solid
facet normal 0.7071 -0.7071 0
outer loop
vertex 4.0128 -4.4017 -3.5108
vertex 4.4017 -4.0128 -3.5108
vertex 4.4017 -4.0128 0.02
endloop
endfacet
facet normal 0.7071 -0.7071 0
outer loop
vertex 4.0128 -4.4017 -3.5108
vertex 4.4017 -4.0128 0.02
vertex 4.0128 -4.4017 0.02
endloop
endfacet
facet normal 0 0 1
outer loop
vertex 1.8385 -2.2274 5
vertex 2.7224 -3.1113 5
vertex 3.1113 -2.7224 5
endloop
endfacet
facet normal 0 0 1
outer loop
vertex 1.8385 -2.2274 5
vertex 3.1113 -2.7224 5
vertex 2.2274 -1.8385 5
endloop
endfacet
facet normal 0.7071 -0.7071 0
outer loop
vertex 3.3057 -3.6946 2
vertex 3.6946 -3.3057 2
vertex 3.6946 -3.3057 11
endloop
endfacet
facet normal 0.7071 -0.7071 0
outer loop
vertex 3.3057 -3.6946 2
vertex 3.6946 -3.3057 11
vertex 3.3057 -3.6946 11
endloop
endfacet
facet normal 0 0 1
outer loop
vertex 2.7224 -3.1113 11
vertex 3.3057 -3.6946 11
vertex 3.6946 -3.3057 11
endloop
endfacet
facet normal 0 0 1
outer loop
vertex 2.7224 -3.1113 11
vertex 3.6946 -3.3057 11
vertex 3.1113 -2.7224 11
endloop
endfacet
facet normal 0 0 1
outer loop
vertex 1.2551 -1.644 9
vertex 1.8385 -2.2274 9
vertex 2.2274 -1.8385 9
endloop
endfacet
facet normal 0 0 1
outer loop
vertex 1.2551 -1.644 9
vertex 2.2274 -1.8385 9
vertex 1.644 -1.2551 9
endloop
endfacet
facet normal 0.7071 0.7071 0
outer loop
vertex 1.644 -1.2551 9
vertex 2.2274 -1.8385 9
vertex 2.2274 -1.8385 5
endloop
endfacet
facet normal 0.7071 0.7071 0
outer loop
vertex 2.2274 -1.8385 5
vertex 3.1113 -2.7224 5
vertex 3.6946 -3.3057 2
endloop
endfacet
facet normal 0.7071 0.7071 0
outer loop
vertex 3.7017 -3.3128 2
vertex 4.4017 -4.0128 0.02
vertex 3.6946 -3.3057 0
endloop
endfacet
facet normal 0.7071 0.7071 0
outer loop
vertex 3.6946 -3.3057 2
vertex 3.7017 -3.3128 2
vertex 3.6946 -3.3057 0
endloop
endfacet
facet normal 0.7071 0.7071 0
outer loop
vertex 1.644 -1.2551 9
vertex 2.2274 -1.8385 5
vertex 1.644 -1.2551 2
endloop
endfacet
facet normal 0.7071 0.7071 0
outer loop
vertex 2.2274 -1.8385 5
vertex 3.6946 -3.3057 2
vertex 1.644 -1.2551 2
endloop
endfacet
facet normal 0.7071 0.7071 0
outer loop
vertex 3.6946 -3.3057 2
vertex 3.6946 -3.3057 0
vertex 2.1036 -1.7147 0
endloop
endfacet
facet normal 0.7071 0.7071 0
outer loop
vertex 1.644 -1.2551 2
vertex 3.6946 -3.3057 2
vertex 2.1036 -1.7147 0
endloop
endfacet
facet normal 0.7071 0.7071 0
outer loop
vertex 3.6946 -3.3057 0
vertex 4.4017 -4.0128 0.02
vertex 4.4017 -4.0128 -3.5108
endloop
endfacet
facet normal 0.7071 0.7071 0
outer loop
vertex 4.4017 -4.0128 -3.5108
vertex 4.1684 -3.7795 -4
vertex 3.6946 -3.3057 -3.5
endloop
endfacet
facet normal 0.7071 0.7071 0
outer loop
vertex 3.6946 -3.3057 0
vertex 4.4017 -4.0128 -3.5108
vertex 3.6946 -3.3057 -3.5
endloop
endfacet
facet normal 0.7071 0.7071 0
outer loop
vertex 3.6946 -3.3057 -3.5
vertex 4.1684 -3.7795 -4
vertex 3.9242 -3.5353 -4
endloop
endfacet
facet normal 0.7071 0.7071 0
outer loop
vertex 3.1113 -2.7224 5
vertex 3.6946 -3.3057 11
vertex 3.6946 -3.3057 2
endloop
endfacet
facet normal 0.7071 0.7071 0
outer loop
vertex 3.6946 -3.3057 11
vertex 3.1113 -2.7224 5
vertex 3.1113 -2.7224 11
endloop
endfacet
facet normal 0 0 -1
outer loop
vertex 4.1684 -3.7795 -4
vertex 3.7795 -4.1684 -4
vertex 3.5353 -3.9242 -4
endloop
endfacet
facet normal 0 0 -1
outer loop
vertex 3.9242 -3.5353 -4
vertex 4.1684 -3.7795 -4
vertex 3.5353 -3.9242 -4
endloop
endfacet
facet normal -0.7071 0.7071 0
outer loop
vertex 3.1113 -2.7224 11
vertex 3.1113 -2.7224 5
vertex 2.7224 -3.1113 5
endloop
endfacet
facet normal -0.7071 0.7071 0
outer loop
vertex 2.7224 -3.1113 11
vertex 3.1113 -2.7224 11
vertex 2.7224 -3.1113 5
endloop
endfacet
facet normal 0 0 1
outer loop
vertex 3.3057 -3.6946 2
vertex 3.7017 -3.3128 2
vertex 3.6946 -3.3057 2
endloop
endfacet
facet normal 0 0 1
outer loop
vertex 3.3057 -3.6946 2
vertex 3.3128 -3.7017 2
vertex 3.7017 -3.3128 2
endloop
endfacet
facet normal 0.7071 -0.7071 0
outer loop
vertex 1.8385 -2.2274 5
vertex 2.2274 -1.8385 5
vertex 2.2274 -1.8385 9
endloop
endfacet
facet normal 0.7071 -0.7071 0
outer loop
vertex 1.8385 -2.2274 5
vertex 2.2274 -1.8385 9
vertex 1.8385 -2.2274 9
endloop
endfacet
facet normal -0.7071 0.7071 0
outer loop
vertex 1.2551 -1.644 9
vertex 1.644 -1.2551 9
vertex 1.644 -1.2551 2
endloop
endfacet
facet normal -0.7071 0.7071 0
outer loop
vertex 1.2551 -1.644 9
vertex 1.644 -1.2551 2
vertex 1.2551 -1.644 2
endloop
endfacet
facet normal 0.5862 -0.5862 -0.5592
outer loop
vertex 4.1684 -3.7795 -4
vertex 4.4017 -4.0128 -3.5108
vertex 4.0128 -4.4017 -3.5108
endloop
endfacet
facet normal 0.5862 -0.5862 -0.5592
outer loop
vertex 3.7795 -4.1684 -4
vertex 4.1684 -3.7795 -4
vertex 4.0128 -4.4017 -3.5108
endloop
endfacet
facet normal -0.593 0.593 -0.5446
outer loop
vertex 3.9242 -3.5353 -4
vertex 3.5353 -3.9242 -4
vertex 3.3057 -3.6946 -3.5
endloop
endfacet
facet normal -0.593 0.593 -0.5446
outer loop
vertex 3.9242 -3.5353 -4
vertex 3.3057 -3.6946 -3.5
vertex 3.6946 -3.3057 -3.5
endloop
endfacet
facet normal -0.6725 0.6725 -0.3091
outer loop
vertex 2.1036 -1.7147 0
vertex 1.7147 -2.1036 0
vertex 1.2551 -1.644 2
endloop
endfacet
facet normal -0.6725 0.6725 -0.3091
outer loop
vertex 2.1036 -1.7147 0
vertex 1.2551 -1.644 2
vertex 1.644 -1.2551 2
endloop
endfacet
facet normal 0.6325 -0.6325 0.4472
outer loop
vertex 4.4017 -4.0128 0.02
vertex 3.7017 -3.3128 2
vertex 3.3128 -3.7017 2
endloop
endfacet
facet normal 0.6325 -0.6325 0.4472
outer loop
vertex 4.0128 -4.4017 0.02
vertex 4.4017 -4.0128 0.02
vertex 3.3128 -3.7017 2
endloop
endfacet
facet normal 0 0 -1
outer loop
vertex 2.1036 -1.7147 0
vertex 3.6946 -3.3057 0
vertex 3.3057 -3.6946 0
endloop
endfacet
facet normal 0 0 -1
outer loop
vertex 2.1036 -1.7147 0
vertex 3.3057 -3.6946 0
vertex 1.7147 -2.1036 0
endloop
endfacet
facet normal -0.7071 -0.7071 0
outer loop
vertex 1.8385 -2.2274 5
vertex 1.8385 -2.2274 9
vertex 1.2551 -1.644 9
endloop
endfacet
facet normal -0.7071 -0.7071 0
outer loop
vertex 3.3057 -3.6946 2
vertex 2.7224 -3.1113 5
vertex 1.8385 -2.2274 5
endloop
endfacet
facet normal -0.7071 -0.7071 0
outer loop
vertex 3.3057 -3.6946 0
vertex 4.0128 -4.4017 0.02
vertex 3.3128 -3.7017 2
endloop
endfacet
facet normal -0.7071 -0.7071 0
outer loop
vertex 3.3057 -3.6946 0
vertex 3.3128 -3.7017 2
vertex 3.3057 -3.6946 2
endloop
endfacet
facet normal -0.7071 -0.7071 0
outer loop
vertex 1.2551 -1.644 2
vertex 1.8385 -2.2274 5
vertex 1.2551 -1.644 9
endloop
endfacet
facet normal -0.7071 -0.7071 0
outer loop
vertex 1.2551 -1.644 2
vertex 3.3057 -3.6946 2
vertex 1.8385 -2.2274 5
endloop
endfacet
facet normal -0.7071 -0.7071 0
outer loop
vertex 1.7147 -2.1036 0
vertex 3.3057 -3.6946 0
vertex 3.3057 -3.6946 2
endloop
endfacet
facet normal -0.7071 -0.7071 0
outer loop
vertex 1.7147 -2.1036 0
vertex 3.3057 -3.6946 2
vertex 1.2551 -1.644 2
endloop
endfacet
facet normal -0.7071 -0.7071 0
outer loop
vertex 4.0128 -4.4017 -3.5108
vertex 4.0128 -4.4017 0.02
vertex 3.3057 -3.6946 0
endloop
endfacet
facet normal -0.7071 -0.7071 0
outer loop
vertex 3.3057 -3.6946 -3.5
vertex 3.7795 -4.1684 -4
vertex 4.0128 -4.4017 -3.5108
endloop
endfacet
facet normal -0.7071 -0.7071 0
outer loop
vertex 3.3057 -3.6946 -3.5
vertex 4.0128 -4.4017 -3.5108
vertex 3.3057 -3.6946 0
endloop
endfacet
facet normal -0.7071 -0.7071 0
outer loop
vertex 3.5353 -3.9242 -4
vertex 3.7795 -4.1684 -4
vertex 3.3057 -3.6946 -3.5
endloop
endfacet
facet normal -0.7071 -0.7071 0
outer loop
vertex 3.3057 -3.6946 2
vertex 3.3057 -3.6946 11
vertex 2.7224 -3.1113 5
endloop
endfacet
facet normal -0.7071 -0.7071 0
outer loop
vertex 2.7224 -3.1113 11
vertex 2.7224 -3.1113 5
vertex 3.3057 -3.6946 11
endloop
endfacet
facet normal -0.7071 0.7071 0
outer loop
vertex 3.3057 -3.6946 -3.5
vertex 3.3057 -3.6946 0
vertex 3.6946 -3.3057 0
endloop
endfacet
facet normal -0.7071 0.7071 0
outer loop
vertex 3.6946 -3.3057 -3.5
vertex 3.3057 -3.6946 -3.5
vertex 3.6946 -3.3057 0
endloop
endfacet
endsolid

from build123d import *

# Parameters (mm, degrees)
BOX076_W                = 2.9
BOX076_H                = 0.55
BOX076_DEPTH            = 15
BOX077_W                = 1.25
BOX077_H                = 0.55
BOX077_DEPTH            = 6
BOX078_W                = 1.1
BOX078_H                = 0.6
BOX078_DEPTH            = 2
BOX080_W                = 1
BOX080_H                = 0.55
BOX080_DEPTH            = 6
BOX079_W                = 3
BOX079_H                = 0.55
BOX079_DEPTH            = 4
CHAMFER038_SIZE2        = 0.65
CHAMFER038_SIZE         = 2
CHAMFER039_ANGLE        = 33
CHAMFER039_SIZE         = 0.5
CHAMFER041_ANGLE        = 56
CHAMFER041_SIZE         = 0.33
CHAMFER040_ANGLE        = 26.565
CHAMFER040_SIZE         = 1.98
BODY030_PLACEMENT_ANGLE = 135


with BuildPart() as part:
    # Box076 → Box076 (join)
    with BuildSketch(Plane(origin=(-4.95, -0.275, 0), x_dir=(1, 0, 0), z_dir=(0, 0, 1))):
        with Locations((1.45, 0.275)):
            Rectangle(BOX076_W, BOX076_H)
    extrude(amount=BOX076_DEPTH)

    # Box077 → Box077 (cut)
    with BuildSketch(Plane(origin=(-4.125, -0.275, 9), x_dir=(1, 0, 0), z_dir=(0, 0, 1))):
        with Locations((0.625, 0.275)):
            Rectangle(BOX077_W, BOX077_H)
    extrude(amount=BOX077_DEPTH, mode=Mode.SUBTRACT)

    # Box078 → Box078 (cut)
    with BuildSketch(Plane(origin=(-3, -0.3, 13), x_dir=(1, 0, 0), z_dir=(0, 0, 1))):
        with Locations((0.55, 0.3)):
            Rectangle(BOX078_W, BOX078_H)
    extrude(amount=BOX078_DEPTH, mode=Mode.SUBTRACT)

    # Box080 → Box080 (join)
    with BuildSketch(Plane(origin=(-5.95, -0.275, 0), x_dir=(1, 0, 0), z_dir=(0, 0, 1))):
        with Locations((0.5, 0.275)):
            Rectangle(BOX080_W, BOX080_H)
    extrude(amount=BOX080_DEPTH)

    # Box079 → Box079 (cut)
    with BuildSketch(Plane(origin=(-4.95, 0.275, 4), x_dir=(1, 0, 0), z_dir=(0, 0, -1))):
        with Locations((1.5, 0.275)):
            Rectangle(BOX079_W, BOX079_H)
    extrude(amount=BOX079_DEPTH, mode=Mode.SUBTRACT)

    # Chamfer038
    chamfer038_edges = [part.edges().sort_by_distance(p)[0] for p in [
        (-2.05, 0, 4),
    ]]
    chamfer038_side = part.faces().sort_by_distance((-2.05, 0, 8.5))[0]
    chamfer(chamfer038_edges, length=CHAMFER038_SIZE, length2=CHAMFER038_SIZE2, reference=chamfer038_side)

    # Chamfer039
    chamfer039_edges = [part.edges().sort_by_distance(p)[0] for p in [
        (-4.95, 0, 0),
    ]]
    chamfer039_side = part.faces().sort_by_distance((-4.95, 0, 2))[0]
    chamfer(chamfer039_edges, length=CHAMFER039_SIZE, angle=CHAMFER039_ANGLE, reference=chamfer039_side)

    # Chamfer041
    chamfer041_edges = [part.edges().sort_by_distance(p)[0] for p in [
        (-5.95, 0, 0),
    ]]
    chamfer041_side = part.faces().sort_by_distance((-5.612352, 0, 0))[0]
    chamfer(chamfer041_edges, length=CHAMFER041_SIZE, angle=CHAMFER041_ANGLE, reference=chamfer041_side)

    # Chamfer040
    chamfer040_edges = [part.edges().sort_by_distance(p)[0] for p in [
        (-5.95, 0, 6),
    ]]
    chamfer040_side = part.faces().sort_by_distance((-5.95, 0, 3.244623))[0]
    chamfer(chamfer040_edges, length=CHAMFER040_SIZE, angle=CHAMFER040_ANGLE, reference=chamfer040_side)


with BuildPart() as part_1:
    # Body030 placement: moved
    add(part.part.moved(Location((0, 0, -4))).rotate(Axis((0, 0, -4), (0, 0, 1)), BODY030_PLACEMENT_ANGLE))


solid = part_1.part
